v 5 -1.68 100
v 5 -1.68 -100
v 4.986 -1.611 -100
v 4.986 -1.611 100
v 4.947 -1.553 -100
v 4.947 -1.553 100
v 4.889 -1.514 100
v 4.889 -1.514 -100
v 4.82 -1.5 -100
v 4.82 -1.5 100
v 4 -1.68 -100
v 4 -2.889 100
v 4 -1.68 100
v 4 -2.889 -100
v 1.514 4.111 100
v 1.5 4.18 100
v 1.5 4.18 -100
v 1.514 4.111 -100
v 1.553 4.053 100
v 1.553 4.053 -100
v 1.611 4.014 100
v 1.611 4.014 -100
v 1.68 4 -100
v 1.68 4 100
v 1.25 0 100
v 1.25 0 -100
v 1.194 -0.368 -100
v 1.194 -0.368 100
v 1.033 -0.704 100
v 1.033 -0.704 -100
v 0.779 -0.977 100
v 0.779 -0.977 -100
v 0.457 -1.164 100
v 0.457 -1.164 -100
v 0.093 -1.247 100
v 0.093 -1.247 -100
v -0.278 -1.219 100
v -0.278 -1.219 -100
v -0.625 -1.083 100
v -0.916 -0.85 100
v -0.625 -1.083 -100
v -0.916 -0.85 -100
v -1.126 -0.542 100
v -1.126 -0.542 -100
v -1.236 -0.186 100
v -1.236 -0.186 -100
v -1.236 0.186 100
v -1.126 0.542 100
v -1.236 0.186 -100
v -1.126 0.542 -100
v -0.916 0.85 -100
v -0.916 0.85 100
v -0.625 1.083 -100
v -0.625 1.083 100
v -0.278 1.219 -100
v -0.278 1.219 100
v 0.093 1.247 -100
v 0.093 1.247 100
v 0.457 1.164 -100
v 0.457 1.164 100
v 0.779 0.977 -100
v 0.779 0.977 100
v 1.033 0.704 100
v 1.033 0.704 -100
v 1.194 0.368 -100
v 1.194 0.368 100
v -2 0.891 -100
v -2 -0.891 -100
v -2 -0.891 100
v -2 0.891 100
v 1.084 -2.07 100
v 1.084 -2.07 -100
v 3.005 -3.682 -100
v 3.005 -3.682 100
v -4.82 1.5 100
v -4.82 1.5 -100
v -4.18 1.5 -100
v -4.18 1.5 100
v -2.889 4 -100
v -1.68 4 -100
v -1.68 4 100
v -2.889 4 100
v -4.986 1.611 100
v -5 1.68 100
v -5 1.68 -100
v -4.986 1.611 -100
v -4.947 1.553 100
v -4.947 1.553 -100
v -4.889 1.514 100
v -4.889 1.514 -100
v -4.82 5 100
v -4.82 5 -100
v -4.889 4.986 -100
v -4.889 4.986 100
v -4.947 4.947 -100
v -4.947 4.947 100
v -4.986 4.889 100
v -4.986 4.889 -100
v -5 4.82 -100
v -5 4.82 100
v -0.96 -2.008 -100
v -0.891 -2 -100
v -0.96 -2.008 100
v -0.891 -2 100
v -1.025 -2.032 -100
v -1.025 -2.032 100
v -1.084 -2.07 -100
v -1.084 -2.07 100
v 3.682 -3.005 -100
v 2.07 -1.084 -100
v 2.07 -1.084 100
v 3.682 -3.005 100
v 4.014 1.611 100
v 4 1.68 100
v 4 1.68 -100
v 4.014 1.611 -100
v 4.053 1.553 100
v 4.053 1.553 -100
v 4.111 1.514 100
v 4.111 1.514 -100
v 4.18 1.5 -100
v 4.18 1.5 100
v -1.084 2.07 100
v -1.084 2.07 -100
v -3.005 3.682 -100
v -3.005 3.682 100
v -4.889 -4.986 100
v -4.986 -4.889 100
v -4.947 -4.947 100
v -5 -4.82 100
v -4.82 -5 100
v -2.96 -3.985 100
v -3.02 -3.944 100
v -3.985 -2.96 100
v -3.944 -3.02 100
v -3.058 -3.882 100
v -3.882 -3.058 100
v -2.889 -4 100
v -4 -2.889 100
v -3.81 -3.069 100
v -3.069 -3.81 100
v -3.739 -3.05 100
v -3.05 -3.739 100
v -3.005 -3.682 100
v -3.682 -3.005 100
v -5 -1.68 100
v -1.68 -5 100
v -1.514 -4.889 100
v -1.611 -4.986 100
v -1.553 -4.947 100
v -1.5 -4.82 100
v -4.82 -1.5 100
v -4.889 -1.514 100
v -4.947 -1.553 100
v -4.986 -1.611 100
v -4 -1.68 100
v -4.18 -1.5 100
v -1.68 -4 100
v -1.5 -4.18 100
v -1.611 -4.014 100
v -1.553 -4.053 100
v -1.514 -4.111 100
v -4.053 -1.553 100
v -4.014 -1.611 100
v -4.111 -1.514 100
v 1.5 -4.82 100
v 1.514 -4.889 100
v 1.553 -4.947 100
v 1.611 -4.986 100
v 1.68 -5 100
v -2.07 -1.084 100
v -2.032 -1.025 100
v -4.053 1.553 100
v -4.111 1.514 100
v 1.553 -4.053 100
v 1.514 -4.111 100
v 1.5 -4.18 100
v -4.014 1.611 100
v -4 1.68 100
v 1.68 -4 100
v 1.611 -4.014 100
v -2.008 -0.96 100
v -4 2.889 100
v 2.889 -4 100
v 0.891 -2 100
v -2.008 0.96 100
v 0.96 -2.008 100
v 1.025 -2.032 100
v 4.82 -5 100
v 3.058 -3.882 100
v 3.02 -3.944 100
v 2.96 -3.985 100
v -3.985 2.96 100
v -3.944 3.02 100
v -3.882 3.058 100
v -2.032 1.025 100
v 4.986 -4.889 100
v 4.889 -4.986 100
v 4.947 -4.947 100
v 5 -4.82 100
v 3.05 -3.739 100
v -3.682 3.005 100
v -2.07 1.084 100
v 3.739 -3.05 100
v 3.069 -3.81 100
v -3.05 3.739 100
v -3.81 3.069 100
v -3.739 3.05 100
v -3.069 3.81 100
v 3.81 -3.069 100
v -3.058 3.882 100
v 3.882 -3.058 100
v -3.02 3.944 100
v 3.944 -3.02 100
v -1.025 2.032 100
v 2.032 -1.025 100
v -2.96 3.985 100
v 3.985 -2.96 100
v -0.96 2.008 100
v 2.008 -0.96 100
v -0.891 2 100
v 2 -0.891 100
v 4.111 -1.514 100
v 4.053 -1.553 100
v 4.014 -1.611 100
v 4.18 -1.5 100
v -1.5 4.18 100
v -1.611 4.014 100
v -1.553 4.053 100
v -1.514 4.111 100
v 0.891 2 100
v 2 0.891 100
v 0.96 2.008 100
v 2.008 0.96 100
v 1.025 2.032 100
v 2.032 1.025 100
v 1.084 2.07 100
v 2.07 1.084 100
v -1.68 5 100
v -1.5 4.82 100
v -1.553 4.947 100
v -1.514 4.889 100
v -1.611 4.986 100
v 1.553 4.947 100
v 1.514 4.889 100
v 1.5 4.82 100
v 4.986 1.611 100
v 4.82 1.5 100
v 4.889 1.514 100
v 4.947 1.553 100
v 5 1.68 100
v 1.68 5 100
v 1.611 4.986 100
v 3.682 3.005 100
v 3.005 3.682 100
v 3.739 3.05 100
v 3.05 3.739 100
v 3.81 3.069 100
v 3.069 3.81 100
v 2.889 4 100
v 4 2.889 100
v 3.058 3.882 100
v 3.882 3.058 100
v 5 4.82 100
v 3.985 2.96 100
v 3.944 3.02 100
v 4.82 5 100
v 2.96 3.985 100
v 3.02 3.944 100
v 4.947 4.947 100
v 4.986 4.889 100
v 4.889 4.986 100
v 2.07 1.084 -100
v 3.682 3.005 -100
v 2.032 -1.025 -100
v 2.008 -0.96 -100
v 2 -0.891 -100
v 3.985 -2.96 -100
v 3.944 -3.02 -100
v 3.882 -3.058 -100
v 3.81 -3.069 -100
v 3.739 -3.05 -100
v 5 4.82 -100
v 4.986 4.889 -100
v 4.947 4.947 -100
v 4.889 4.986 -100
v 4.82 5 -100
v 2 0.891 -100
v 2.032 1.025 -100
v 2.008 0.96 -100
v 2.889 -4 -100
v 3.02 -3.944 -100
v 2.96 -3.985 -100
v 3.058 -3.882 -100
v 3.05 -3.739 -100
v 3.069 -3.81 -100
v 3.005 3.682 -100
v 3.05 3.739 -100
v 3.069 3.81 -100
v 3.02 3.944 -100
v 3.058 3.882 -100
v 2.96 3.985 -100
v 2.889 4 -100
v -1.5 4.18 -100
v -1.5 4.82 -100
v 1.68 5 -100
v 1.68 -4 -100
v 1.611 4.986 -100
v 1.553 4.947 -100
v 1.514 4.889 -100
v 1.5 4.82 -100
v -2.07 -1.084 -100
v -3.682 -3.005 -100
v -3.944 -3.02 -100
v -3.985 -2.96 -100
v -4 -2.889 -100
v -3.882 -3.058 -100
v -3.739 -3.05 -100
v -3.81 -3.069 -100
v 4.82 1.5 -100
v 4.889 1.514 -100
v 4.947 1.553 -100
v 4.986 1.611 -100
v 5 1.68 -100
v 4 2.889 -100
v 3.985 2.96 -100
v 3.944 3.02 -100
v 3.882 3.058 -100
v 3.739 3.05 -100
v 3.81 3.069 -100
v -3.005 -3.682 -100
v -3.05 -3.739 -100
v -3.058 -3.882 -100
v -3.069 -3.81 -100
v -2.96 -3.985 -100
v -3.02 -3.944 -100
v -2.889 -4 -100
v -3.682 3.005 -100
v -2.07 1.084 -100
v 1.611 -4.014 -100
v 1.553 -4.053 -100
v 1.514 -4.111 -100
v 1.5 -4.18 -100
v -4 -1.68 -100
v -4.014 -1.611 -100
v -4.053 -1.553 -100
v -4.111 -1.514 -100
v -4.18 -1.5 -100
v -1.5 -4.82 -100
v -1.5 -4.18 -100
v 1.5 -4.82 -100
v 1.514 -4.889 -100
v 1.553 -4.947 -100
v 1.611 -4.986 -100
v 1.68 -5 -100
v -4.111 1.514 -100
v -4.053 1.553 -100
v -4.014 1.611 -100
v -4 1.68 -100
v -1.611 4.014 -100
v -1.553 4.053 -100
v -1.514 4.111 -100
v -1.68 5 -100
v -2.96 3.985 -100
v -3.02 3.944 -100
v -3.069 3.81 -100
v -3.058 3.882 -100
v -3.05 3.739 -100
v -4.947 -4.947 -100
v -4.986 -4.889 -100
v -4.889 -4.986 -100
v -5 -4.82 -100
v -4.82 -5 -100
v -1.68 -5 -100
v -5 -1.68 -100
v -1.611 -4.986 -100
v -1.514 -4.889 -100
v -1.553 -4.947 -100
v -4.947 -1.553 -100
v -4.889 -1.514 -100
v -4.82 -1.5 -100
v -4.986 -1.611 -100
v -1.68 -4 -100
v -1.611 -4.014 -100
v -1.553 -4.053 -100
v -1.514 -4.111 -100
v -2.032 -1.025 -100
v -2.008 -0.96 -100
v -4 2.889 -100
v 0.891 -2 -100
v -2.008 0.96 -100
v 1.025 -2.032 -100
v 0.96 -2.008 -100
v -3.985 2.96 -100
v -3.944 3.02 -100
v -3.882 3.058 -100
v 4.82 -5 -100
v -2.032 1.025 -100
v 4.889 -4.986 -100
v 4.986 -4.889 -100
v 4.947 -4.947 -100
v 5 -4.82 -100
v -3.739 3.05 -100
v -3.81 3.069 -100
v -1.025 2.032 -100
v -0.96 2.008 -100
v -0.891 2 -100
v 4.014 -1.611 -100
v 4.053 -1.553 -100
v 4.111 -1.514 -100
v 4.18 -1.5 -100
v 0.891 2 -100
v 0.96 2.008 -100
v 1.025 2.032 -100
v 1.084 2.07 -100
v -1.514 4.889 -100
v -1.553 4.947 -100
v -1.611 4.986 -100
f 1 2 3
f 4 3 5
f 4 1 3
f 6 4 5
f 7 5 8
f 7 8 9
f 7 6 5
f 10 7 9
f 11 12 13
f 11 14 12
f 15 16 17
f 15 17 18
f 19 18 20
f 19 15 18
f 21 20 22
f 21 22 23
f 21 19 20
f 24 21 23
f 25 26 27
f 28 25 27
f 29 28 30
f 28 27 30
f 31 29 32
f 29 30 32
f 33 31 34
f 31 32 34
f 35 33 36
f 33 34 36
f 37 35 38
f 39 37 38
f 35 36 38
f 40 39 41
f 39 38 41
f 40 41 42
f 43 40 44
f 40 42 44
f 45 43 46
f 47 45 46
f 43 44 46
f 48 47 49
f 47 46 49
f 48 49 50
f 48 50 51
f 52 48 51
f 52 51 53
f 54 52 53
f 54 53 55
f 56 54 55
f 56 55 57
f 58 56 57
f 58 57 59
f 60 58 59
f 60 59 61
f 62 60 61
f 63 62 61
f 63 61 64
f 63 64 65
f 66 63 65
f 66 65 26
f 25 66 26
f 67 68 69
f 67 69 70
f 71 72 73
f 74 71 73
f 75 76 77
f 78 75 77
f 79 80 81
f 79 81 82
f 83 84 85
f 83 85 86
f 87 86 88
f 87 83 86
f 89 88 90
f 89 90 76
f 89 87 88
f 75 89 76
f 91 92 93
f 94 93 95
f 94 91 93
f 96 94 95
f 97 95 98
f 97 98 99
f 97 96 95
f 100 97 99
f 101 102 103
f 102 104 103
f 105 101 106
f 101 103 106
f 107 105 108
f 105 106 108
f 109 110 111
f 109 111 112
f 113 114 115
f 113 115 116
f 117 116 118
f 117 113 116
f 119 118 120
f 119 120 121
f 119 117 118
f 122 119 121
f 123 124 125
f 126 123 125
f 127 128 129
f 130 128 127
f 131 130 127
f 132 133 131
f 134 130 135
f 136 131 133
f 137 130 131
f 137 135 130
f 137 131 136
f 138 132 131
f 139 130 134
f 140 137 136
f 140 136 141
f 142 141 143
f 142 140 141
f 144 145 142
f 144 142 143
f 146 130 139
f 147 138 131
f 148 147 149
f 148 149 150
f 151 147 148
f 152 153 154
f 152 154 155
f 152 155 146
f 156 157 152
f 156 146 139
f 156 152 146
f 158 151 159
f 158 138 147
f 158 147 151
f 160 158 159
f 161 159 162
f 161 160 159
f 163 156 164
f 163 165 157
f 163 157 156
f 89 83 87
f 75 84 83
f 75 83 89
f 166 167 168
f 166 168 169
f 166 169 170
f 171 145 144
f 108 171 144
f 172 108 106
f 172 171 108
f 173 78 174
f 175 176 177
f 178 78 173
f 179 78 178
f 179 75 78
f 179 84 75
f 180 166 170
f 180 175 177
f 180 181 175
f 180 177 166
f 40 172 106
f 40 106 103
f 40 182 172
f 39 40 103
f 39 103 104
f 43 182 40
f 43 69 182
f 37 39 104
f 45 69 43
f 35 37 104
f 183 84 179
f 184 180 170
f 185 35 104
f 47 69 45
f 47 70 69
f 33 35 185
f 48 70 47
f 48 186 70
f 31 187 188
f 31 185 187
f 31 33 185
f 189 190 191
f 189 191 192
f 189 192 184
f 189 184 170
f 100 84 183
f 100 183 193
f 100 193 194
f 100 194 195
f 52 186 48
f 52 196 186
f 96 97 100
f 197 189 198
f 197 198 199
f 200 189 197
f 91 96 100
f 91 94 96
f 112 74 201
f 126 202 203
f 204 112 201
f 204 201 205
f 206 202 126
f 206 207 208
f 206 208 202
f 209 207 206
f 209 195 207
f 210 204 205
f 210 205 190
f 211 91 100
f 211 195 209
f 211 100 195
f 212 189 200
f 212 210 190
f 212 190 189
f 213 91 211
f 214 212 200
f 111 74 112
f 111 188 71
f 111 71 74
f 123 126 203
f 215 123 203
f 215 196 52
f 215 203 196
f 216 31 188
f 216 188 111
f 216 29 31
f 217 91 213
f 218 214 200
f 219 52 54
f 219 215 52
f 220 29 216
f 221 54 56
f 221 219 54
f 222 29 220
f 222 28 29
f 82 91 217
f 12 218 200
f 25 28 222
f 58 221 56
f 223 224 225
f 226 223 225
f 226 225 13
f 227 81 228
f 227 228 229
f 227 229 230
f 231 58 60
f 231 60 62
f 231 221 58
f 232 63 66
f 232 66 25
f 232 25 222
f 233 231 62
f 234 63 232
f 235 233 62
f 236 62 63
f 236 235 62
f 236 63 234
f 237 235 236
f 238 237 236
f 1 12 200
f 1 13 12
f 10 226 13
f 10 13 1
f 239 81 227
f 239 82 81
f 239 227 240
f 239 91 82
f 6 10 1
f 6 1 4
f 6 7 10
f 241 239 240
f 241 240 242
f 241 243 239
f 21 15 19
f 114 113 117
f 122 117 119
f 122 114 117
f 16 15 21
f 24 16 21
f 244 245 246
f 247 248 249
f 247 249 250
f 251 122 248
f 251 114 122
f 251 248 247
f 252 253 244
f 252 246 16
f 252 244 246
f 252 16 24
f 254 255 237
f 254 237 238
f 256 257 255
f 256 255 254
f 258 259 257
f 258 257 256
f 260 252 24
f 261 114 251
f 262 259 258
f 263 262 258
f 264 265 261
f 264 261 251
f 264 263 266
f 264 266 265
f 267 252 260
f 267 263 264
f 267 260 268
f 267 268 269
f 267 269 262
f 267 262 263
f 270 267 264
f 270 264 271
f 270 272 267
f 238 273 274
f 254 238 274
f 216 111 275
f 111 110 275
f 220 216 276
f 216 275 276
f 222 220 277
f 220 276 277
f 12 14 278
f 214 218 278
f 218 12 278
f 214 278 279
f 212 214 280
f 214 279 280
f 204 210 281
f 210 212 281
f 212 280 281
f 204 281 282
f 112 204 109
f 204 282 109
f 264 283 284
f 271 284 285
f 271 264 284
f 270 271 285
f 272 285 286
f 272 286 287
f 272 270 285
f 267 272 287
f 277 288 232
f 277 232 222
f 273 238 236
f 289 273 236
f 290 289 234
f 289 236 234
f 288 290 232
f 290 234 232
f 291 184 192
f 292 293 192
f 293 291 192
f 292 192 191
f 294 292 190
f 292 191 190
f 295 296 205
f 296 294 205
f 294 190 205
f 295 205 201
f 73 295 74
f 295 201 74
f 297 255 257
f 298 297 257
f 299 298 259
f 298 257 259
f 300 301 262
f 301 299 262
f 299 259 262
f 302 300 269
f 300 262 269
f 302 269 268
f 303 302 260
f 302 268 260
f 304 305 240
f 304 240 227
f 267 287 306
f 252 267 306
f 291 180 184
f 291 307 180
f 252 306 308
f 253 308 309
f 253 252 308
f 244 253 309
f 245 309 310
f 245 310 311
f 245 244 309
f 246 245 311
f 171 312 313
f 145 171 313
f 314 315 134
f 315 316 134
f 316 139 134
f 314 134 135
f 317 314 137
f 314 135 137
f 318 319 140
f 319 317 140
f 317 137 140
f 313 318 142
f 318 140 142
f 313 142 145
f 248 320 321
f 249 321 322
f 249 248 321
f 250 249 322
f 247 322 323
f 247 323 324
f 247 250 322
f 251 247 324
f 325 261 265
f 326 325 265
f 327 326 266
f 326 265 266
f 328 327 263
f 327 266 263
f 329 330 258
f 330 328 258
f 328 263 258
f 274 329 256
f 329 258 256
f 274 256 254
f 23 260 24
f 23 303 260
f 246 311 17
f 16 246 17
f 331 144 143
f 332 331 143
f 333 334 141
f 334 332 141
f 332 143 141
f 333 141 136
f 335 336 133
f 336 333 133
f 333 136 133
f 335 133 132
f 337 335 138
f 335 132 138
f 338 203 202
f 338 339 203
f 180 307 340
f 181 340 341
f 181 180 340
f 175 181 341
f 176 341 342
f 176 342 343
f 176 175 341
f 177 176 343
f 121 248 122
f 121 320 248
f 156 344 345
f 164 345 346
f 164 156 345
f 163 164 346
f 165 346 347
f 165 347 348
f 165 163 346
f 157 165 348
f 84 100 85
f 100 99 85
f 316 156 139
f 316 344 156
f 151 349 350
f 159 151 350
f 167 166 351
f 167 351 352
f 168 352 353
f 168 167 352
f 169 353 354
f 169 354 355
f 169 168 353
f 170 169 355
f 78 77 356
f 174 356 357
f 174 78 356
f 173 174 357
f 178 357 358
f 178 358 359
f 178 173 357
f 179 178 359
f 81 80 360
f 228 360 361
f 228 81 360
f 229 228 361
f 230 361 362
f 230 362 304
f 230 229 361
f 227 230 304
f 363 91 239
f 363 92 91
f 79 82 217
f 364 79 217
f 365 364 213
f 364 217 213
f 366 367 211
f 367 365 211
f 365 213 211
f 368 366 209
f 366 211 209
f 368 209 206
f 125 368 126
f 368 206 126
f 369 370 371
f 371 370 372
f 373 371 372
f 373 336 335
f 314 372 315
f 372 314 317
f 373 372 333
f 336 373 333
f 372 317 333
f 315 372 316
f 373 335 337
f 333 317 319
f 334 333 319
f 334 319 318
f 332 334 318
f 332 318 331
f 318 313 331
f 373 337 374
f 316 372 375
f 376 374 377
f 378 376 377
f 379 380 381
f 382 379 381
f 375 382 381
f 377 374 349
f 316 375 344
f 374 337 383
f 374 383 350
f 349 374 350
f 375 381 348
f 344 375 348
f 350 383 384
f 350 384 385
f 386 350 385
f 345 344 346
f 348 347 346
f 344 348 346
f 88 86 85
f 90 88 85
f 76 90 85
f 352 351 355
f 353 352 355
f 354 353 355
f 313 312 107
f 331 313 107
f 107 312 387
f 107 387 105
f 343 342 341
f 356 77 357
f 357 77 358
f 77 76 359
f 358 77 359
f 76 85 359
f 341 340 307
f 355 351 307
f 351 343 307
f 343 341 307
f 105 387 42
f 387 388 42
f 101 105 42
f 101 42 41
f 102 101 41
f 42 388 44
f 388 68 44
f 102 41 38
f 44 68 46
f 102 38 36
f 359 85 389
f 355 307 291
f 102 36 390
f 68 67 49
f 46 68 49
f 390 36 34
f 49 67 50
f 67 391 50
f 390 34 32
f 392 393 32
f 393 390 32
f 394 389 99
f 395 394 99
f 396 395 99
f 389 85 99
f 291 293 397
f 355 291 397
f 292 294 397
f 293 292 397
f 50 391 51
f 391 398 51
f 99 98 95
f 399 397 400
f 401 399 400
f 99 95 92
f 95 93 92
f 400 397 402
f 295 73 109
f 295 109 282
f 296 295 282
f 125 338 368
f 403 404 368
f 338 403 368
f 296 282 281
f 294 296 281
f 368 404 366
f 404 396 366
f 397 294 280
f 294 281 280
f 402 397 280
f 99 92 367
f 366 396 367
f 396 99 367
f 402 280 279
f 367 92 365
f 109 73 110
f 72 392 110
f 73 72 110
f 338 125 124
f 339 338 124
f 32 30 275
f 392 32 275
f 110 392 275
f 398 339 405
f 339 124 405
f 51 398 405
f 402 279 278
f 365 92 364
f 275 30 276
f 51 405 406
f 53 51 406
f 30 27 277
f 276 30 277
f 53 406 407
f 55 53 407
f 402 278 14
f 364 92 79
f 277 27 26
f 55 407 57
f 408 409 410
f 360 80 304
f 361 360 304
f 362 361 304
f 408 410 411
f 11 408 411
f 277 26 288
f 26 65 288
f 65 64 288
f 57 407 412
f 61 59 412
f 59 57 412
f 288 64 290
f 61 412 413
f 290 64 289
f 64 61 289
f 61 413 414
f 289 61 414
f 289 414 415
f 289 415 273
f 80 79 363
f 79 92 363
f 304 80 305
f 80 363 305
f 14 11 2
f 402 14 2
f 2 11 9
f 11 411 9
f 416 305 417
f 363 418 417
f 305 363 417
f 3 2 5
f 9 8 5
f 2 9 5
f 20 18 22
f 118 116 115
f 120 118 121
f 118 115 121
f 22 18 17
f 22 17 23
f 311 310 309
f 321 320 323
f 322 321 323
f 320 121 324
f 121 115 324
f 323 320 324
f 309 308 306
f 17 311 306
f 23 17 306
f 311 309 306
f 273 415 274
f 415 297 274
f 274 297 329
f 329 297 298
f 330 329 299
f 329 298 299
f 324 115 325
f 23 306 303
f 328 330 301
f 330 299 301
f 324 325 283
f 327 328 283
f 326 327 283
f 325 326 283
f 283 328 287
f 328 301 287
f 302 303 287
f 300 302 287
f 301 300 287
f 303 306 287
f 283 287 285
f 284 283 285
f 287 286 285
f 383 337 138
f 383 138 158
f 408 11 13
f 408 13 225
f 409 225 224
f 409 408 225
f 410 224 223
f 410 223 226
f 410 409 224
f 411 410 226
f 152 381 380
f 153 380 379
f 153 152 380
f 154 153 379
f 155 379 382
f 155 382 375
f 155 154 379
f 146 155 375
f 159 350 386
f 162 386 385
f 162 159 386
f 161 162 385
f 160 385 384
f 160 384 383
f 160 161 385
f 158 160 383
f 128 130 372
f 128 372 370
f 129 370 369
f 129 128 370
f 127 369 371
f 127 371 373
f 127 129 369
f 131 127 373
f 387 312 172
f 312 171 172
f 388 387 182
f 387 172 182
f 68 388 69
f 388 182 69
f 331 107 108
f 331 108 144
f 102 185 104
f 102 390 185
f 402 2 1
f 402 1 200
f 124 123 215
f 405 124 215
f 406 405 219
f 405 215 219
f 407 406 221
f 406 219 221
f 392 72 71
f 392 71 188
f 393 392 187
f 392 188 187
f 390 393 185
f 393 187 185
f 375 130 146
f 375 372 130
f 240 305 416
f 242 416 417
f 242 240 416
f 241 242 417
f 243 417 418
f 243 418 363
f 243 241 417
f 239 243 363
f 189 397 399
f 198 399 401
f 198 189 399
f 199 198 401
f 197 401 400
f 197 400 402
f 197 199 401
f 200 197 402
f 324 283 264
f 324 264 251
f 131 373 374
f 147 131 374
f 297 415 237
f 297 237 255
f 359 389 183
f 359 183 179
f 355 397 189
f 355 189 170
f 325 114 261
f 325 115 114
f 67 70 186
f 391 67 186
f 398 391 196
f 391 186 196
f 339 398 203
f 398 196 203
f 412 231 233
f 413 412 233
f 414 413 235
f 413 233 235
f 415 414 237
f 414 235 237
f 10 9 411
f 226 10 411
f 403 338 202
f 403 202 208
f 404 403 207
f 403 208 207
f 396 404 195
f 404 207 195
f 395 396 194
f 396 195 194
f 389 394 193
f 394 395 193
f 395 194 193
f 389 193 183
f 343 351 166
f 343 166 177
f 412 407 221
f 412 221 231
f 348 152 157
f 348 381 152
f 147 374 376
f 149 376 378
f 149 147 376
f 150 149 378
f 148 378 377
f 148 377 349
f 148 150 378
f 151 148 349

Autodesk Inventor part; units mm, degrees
ref_plane "YZ Plane" through (0, 0, 0) normal (1, 0, 0) x (0, 1, 0)
ref_plane "XZ Plane" through (0, 0, 0) normal (0, 1, 0) x (-1, 0, 0)
ref_plane "XY Plane" through (0, 0, 0) normal (0, 0, 1) x (1, 0, 0)
sketch "Sketch1" plane through (0, 0, 0) normal (0, 0, 1) x (1, 0, 0)
  circle A0 centre (0, 0) radius 1.25
  line L0 (0, -7) -> (0, 7) projected
  line L1 (-7.0223, 0) -> (7.1337, 0) projected
  line L2 (5, 5) -> (1.5, 5)
  line L3 (1.5, 5) -> (1.5, 4)
  line L4 (5, 5) -> (5, 1.5)
  line L5 (-1, 2) -> (1, 2)
  line L6 (2, 1) -> (2, -1)
  line L7 (1, -2) -> (-1, -2)
  line L8 (-2, -1) -> (-2, 1)
  line L9 (1, 2) -> (3.3835, 4)
  line L10 (2, 2) -> (4.1114, 2) construction
  line L11 (3.3835, 4) -> (1.5, 4)
  line L12 (2, 1) -> (4, 3.3835)
  line L13 (2, 1) -> (5.1114, 1) construction
  line L14 (5, 1.5) -> (4, 1.5)
  line L15 (4, 1.5) -> (4, 3.3835)
  line L16 (5, 5) -> (5, 1.5)
  line L17 (-5, 5) -> (-1.5, 5)
  line L18 (1.5, 5) -> (5, 5)
  line L19 (5, 5) -> (5, 1.5)
  line L20 (5, 0) -> (5, -5)
  line L21 (-2, 1) -> (-4, 3.3835)
  line L22 (-4, 3.3835) -> (-4, 1.5)
  line L23 (-5, 1.5) -> (-4, 1.5)
  line L24 (-5, 5) -> (-5, 1.5)
  line L25 (-5, 5) -> (-1.5, 5)
  line L26 (-1.5, 5) -> (-1.5, 4)
  line L27 (-1.5, 4) -> (-3.3835, 4)
  line L28 (-1, 2) -> (-3.3835, 4)
  line L29 (-1, -2) -> (-3.3835, -4)
  line L30 (-3.3835, -4) -> (-1.5, -4)
  line L31 (-1.5, -5) -> (-1.5, -4)
  line L32 (-5, -5) -> (-1.5, -5)
  line L33 (-5, -5) -> (-5, -1.5)
  line L34 (-5, -1.5) -> (-4, -1.5)
  line L35 (-4, -1.5) -> (-4, -3.3835)
  line L36 (-2, -1) -> (-4, -3.3835)
  line L37 (2, -1) -> (4, -3.3835)
  line L38 (4, -3.3835) -> (4, -1.5)
  line L39 (5, -1.5) -> (4, -1.5)
  line L40 (5, -5) -> (5, -1.5)
  line L41 (5, -5) -> (1.5, -5)
  line L42 (1.5, -5) -> (1.5, -4)
  line L43 (1.5, -4) -> (3.3835, -4)
  line L44 (1, -2) -> (3.3835, -4)
  line L45 (-5, -5) -> (-5, -1.5)
  line L46 (-5, 1.5) -> (-5, 5)
  line L47 (5, -5) -> (1.5, -5)
  line L48 (-1.5, -5) -> (-5, -5)
  dimension "d0" = 2.5
  dimension "d3" = 3.5
  dimension "d4" = 1
  dimension "d5" = 90
  dimension "d6" = 3.5
  dimension "d10" = 2
  dimension "d11" = 40
  dimension "d13" = 50
  dimension "d14" = 1
  dimension "d17" = 360
  dimension "d19" = 3.1115
extrude "Extrusion1" add sketch "Sketch1" along normal mid plane 200 contours L1 L6 L37 L38 L39 L20 L41 L42 L43 L44 L7 L0 A0 | A0 L0 L5 L9 L11 L3 L2 L4 L14 L15 L12 L6 L1 | A0 L1 L8 L21 L22 L23 L24 L17 L26 L27 L28 L5 L0 | L0 L7 L29 L30 L31 L32 L33 L34 L35 L36 L8 L1 A0
fillet "Fillet1" radius 0.18 28 edges at (-5, 5, 0) (-5, 1.5, 0) (-1.5, 5, 0) (-1.5, 4, 0) (-4, 1.5, 0) (-3.3835, 4, 0) (-4, 3.3835, 0) (1.5, 5, 0) (5, 5, 0) (3.3835, 4, 0) (4, 3.3835, 0) (4, 1.5, 0) (5, 1.5, 0) (1.5, 4, 0) (4, -1.5, 0) (5, -1.5, 0) (5, -5, 0) (4, -3.3835, 0) (3.3835, -4, 0) (1.5, -4, 0) (1.5, -5, 0) (-3.3835, -4, 0) (-4, -3.3835, 0) (-4, -1.5, 0) (-5, -1.5, 0) (-5, -5, 0) (-1.5, -5, 0) (-1.5, -4, 0)
fillet "Fillet2" radius 0.3 8 edges at (-1, 2, 0) (1, 2, 0) (2, 1, 0) (2, -1, 0) (1, -2, 0) (-1, -2, 0) (-2, -1, 0) (-2, 1, 0)
thread "Thread1" size "M3x0.5" class "6H" standard "ANSI Metric M Profile" length 8
thread "Thread2" size "M3x0.5" class "6H" standard "ANSI Metric M Profile" length 8
properties part number "Beam_20mm"
